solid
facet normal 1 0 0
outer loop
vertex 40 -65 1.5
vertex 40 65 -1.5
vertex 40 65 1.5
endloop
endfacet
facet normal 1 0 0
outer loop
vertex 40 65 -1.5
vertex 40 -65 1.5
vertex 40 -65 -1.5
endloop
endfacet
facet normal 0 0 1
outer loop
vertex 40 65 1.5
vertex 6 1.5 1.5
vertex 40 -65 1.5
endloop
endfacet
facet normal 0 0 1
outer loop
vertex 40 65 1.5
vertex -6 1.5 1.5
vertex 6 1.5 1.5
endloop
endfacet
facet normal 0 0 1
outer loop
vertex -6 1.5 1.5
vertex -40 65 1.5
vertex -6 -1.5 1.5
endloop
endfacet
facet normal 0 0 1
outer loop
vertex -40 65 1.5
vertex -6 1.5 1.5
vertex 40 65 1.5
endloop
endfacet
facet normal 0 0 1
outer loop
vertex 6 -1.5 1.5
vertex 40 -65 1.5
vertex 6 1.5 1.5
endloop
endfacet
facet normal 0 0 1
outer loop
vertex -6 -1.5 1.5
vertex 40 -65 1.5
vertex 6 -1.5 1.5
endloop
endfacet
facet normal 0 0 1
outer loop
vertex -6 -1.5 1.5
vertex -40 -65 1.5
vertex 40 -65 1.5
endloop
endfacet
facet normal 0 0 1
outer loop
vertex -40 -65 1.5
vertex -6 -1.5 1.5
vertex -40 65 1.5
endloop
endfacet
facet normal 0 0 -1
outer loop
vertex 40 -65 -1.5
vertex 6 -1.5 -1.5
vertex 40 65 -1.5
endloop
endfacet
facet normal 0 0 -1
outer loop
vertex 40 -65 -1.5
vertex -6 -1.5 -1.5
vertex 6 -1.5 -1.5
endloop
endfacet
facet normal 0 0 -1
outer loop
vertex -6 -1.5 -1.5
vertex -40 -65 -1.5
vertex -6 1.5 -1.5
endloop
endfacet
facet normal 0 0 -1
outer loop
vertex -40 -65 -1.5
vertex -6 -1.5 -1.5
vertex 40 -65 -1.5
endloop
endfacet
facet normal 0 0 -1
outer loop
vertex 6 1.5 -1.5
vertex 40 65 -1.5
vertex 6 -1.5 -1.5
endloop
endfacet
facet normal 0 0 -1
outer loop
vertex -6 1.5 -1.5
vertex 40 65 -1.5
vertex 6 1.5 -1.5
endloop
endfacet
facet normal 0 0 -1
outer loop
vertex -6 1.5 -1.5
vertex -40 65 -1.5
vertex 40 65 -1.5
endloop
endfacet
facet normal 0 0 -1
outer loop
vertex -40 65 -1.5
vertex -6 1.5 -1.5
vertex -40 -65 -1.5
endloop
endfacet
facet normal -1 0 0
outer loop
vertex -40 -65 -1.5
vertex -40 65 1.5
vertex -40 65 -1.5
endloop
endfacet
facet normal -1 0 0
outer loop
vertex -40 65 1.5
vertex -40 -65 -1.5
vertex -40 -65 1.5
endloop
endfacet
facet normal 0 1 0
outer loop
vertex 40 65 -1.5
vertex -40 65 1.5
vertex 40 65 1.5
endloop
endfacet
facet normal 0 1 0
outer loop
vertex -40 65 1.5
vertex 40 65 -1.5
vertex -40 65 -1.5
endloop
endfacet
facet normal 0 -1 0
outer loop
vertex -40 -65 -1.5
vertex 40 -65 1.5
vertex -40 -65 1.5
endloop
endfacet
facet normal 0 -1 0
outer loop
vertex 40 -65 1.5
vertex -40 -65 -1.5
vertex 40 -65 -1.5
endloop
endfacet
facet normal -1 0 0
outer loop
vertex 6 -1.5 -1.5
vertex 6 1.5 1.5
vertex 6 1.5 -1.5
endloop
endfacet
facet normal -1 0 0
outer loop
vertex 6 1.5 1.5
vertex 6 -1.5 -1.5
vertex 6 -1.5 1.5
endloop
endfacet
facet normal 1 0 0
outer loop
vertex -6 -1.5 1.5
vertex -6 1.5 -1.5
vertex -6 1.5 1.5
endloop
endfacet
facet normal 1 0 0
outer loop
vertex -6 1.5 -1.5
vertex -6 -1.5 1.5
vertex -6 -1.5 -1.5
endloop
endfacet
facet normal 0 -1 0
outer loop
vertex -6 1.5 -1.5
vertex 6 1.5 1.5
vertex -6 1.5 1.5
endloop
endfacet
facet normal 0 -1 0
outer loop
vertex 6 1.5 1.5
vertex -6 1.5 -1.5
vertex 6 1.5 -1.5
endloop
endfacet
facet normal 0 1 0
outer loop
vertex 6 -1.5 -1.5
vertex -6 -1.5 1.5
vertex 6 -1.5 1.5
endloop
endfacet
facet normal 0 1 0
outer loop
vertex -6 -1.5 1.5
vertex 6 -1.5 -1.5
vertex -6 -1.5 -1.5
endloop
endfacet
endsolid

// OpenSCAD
// ========================================
// a 80 x 130 x 3 mm plate with one 12 x 3 mm slots
// NeuroCAD canonical IR; dimensions are millimetres
// ========================================
$fn = 48;

difference() {
  cube(size=[80, 130, 3], center=true);
  cube(size=[12, 3, 5], center=true);
}
